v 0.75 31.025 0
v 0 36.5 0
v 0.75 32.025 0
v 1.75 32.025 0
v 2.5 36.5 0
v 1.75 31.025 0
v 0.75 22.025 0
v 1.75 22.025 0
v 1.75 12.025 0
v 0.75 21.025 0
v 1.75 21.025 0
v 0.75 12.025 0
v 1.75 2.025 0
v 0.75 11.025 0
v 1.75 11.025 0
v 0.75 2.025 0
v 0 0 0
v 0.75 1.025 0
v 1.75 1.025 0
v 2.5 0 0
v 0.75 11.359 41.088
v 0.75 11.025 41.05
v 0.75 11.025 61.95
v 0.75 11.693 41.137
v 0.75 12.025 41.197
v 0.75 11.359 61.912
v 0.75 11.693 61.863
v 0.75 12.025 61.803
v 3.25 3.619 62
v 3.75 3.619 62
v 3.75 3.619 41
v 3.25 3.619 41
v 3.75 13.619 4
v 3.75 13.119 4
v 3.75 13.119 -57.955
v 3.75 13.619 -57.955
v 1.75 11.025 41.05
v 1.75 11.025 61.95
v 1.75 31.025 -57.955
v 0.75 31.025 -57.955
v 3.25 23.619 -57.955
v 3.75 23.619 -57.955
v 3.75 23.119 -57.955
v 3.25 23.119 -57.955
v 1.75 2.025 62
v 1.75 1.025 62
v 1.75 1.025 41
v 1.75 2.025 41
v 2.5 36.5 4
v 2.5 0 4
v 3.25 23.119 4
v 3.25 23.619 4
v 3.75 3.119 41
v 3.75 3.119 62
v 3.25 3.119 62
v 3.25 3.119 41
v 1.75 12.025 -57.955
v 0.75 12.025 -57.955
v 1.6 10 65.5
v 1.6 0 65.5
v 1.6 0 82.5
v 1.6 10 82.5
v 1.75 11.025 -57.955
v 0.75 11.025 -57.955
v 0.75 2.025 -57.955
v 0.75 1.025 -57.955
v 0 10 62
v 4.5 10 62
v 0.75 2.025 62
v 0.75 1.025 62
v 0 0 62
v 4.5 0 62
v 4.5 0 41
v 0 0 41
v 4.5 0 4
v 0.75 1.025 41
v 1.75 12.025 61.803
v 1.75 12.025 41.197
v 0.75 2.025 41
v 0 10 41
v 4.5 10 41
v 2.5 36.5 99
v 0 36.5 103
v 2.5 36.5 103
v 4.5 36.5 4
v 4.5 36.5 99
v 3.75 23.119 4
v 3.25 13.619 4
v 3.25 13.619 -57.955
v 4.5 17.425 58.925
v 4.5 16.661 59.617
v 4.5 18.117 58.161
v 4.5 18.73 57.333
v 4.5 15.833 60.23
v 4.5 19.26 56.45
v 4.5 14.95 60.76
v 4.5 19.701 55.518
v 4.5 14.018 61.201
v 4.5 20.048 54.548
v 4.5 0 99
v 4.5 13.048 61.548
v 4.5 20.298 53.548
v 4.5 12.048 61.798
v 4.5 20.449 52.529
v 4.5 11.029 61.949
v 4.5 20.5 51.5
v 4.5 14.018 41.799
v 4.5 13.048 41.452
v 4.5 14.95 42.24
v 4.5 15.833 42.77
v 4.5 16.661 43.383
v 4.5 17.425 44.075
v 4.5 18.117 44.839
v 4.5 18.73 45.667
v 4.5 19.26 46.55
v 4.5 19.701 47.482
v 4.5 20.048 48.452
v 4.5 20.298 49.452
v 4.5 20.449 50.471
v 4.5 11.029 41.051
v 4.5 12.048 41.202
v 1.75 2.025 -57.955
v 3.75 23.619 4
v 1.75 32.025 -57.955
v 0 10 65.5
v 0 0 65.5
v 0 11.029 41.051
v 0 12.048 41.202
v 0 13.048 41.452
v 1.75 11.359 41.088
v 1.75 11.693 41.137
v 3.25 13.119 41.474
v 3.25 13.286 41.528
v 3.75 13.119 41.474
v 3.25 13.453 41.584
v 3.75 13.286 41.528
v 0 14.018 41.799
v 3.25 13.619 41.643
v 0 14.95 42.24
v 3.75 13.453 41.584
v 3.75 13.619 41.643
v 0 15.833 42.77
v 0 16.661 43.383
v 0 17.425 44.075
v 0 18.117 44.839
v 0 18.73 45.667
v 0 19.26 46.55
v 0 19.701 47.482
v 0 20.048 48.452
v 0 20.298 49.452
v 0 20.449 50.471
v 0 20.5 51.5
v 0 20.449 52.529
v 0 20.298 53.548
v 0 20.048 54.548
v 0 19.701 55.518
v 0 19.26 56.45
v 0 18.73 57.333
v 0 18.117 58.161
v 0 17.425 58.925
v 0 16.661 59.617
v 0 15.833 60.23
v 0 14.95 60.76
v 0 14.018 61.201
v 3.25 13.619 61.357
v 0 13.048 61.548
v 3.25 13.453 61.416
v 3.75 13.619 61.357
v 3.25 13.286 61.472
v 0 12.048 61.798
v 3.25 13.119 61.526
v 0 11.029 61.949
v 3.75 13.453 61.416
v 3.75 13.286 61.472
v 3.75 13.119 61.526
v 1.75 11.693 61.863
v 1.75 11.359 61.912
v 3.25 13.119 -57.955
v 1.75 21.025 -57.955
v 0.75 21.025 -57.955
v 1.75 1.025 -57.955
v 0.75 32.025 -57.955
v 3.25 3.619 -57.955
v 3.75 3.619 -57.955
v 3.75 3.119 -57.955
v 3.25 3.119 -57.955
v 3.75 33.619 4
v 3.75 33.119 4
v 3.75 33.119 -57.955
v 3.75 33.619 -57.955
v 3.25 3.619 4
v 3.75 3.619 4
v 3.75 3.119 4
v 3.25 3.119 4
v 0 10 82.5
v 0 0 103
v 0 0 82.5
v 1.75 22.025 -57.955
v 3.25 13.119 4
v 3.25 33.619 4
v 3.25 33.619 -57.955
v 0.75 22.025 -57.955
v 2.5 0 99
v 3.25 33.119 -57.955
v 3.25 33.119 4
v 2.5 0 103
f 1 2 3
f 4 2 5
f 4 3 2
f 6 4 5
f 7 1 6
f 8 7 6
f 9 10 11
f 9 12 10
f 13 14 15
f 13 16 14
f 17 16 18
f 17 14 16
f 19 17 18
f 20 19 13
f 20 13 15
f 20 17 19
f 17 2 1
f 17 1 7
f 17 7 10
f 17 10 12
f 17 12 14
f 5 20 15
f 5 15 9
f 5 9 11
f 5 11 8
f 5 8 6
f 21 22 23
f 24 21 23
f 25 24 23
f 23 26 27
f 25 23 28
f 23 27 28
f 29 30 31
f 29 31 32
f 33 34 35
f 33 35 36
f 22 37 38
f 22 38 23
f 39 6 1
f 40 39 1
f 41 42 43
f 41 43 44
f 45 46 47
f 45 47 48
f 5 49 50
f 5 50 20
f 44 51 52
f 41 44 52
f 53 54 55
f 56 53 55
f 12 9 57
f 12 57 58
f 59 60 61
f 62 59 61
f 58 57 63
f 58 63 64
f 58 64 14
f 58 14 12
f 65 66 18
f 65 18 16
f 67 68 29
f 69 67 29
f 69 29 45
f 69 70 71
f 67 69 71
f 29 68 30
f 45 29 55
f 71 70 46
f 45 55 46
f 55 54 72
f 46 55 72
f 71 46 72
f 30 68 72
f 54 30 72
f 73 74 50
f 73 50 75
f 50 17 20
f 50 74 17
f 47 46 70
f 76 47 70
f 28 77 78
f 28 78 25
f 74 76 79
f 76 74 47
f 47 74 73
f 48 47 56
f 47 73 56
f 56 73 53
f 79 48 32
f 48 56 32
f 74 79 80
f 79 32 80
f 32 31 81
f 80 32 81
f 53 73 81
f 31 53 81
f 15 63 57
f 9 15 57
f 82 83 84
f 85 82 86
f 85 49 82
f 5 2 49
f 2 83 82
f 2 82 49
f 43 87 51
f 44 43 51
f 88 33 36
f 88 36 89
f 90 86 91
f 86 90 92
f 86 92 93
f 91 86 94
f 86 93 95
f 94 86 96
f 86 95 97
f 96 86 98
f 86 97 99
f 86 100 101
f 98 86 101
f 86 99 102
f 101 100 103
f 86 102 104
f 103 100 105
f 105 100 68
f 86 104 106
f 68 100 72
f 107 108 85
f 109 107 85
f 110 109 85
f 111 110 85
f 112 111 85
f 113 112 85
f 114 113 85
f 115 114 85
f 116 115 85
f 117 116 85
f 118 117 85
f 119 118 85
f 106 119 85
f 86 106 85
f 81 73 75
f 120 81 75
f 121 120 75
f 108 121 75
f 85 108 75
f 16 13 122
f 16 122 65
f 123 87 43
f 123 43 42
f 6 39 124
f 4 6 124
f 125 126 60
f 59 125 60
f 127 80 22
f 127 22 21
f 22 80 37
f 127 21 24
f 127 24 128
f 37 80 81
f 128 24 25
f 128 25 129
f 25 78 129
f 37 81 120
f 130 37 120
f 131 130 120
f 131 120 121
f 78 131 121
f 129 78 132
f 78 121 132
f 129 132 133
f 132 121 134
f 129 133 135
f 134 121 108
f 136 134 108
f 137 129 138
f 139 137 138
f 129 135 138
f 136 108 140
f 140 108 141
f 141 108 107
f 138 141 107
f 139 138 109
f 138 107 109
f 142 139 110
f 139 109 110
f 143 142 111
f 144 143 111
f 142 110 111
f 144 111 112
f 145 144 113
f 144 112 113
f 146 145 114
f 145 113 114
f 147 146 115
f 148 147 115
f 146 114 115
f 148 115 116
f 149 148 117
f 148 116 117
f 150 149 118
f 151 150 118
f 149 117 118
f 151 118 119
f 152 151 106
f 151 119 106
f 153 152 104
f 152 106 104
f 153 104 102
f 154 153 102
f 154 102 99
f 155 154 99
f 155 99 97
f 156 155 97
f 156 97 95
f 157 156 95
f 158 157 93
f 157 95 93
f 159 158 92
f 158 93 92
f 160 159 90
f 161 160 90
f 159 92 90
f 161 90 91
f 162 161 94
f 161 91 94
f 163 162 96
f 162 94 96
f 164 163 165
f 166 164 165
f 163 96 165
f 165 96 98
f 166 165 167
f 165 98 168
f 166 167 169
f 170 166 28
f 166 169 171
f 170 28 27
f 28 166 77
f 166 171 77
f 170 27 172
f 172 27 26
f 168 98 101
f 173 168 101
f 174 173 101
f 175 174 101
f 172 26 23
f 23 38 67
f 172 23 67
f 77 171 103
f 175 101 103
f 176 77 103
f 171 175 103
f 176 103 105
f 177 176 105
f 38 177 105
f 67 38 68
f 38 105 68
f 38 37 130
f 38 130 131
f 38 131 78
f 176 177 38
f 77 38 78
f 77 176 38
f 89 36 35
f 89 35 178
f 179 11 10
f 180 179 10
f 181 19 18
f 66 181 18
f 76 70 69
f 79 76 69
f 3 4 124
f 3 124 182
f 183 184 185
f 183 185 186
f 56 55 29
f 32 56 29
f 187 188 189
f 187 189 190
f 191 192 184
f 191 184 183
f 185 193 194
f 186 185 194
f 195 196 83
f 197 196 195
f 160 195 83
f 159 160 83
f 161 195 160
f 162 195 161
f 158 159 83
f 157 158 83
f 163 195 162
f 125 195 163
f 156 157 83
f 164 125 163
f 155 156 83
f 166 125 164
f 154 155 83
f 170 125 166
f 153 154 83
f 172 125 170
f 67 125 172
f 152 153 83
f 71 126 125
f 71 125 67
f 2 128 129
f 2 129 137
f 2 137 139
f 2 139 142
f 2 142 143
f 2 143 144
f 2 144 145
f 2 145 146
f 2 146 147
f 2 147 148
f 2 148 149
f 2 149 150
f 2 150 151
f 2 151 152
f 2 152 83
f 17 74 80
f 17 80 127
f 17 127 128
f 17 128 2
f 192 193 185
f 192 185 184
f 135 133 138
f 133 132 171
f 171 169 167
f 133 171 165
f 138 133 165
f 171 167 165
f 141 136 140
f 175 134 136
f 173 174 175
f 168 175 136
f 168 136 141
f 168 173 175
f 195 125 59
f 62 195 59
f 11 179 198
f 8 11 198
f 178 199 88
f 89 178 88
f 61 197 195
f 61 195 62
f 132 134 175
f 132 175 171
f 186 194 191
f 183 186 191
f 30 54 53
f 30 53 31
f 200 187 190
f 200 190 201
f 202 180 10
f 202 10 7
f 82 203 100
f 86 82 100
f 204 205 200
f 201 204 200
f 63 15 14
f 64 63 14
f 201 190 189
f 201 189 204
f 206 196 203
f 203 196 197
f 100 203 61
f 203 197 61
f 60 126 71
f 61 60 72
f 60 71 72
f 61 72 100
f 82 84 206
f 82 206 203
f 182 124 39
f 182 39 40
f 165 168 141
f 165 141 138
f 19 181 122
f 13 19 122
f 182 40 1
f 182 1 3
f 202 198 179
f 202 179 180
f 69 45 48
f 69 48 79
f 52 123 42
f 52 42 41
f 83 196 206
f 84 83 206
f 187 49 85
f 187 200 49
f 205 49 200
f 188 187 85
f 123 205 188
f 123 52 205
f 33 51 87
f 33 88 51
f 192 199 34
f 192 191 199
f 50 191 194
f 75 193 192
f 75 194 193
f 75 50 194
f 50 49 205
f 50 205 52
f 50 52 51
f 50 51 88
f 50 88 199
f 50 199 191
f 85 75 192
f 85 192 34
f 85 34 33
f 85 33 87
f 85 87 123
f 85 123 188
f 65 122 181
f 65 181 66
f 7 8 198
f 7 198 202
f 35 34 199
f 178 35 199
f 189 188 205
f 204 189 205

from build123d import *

# Parameters (mm, degrees)
SKETCH_1_W          = 2.5
SKETCH_1_H          = 103
SKETCH_1_W_2        = 2
SKETCH_1_H_2        = 95
EXTRUDE_1_DEPTH     = 99.5
CUT_EXTRUDE_2_DEPTH = 4.5
CUT_EXTRUDE_3_DEPTH = 58.5
CUT_EXTRUDE_4_DEPTH = 4.5
SKETCH_6_W          = 1.6
SKETCH_6_H          = 17
CUT_EXTRUDE_5_DEPTH = 10
EXTRUDE_START       = -62
SKETCH_7_W          = 1
SKETCH_7_H          = 1
EXTRUDE_2_DEPTH     = 119.954657
EXTRUDE_START_2     = -58
SKETCH_8_W          = 0.5
SKETCH_8_H          = 0.5
EXTRUDE_3_DEPTH     = 119.954657


with BuildPart() as part:
    # 스케치1 → 보스-돌출1 (new body)
    with BuildSketch(Plane(origin=(0, 0, 0), x_dir=(1, 0, 0), z_dir=(0, 1, 0))):
        with Locations((1.25, -51.5)):
            Rectangle(SKETCH_1_W, SKETCH_1_H)
        with Locations((3.5, -51.5)):
            Rectangle(SKETCH_1_W_2, SKETCH_1_H_2)
    extrude(amount=EXTRUDE_1_DEPTH)

    # 스케치2 → 컷-돌출2 (cut)
    with BuildSketch(Plane(origin=(4.5, 0, 0), x_dir=(0, 0, -1), z_dir=(1, 0, 0))):
        with BuildLine():
            Line((-62, 10), (-62, 0))
            Line((-62, 0), (-41, 0))
            Line((-41, 0), (-41, 10))
            ThreePointArc((-41, 10), (-51.5, 20.5), (-62, 10))
        make_face()
    extrude(amount=-CUT_EXTRUDE_2_DEPTH, mode=Mode.SUBTRACT)

    # 스케치3 → 컷-돌출3 (cut)
    with BuildSketch(Plane(origin=(0, 99.5, 0), x_dir=(1, 0, 0), z_dir=(0, 1, 0))):
        Polygon((2.5, -4), (2.5, 0), (0, 0), (0, -103), (2.5, -103), (2.5, -99), (4.5, -99), (4.5, -4), align=None)
    extrude(amount=-CUT_EXTRUDE_3_DEPTH, mode=Mode.SUBTRACT)

    # 스케치4 → 컷-돌출4 (cut)
    with BuildSketch(Plane(origin=(0, 41, 0), x_dir=(1, 0, 0), z_dir=(0, 1, 0))):
        Polygon((4.5, -4), (2.5, -4), (2.5, 0), (0, 0), (0, -103), (2.5, -103), (2.5, -99), (4.5, -99), align=None)
    extrude(amount=-CUT_EXTRUDE_4_DEPTH, mode=Mode.SUBTRACT)

    # 스케치6 → 컷-돌출5 (cut)
    with BuildSketch(Plane.XZ):
        with Locations((0.8, 74)):
            Rectangle(SKETCH_6_W, SKETCH_6_H)
    extrude(amount=-CUT_EXTRUDE_5_DEPTH, mode=Mode.SUBTRACT)

    # 스케치7 → 보스-돌출2 (add)
    with BuildSketch(Plane(origin=(0, 0, 0), x_dir=(-1, 0, 0), z_dir=(0, 0, -1)).offset(EXTRUDE_START)):
        with Locations((-1.25, 1.524584525)):
            Rectangle(SKETCH_7_W, SKETCH_7_H)
        with Locations((-1.25, 11.524584525)):
            Rectangle(SKETCH_7_W, SKETCH_7_H)
        with Locations((-1.25, 21.524584525)):
            Rectangle(SKETCH_7_W, SKETCH_7_H)
        with Locations((-1.25, 31.524584525)):
            Rectangle(SKETCH_7_W, SKETCH_7_H)
    extrude(amount=EXTRUDE_2_DEPTH)

    # 스케치8 → 보스-돌출3 (add)
    with BuildSketch(Plane(origin=(0, 0, 4), x_dir=(-1, 0, 0), z_dir=(0, 0, -1)).offset(EXTRUDE_START_2)):
        with Locations((-3.5, 3.368615417)):
            Rectangle(SKETCH_8_W, SKETCH_8_H)
        with Locations((-3.5, 13.368615417)):
            Rectangle(SKETCH_8_W, SKETCH_8_H)
        with Locations((-3.5, 23.368615417)):
            Rectangle(SKETCH_8_W, SKETCH_8_H)
        with Locations((-3.5, 33.368615417)):
            Rectangle(SKETCH_8_W, SKETCH_8_H)
    extrude(amount=EXTRUDE_3_DEPTH)


solid = part.part
